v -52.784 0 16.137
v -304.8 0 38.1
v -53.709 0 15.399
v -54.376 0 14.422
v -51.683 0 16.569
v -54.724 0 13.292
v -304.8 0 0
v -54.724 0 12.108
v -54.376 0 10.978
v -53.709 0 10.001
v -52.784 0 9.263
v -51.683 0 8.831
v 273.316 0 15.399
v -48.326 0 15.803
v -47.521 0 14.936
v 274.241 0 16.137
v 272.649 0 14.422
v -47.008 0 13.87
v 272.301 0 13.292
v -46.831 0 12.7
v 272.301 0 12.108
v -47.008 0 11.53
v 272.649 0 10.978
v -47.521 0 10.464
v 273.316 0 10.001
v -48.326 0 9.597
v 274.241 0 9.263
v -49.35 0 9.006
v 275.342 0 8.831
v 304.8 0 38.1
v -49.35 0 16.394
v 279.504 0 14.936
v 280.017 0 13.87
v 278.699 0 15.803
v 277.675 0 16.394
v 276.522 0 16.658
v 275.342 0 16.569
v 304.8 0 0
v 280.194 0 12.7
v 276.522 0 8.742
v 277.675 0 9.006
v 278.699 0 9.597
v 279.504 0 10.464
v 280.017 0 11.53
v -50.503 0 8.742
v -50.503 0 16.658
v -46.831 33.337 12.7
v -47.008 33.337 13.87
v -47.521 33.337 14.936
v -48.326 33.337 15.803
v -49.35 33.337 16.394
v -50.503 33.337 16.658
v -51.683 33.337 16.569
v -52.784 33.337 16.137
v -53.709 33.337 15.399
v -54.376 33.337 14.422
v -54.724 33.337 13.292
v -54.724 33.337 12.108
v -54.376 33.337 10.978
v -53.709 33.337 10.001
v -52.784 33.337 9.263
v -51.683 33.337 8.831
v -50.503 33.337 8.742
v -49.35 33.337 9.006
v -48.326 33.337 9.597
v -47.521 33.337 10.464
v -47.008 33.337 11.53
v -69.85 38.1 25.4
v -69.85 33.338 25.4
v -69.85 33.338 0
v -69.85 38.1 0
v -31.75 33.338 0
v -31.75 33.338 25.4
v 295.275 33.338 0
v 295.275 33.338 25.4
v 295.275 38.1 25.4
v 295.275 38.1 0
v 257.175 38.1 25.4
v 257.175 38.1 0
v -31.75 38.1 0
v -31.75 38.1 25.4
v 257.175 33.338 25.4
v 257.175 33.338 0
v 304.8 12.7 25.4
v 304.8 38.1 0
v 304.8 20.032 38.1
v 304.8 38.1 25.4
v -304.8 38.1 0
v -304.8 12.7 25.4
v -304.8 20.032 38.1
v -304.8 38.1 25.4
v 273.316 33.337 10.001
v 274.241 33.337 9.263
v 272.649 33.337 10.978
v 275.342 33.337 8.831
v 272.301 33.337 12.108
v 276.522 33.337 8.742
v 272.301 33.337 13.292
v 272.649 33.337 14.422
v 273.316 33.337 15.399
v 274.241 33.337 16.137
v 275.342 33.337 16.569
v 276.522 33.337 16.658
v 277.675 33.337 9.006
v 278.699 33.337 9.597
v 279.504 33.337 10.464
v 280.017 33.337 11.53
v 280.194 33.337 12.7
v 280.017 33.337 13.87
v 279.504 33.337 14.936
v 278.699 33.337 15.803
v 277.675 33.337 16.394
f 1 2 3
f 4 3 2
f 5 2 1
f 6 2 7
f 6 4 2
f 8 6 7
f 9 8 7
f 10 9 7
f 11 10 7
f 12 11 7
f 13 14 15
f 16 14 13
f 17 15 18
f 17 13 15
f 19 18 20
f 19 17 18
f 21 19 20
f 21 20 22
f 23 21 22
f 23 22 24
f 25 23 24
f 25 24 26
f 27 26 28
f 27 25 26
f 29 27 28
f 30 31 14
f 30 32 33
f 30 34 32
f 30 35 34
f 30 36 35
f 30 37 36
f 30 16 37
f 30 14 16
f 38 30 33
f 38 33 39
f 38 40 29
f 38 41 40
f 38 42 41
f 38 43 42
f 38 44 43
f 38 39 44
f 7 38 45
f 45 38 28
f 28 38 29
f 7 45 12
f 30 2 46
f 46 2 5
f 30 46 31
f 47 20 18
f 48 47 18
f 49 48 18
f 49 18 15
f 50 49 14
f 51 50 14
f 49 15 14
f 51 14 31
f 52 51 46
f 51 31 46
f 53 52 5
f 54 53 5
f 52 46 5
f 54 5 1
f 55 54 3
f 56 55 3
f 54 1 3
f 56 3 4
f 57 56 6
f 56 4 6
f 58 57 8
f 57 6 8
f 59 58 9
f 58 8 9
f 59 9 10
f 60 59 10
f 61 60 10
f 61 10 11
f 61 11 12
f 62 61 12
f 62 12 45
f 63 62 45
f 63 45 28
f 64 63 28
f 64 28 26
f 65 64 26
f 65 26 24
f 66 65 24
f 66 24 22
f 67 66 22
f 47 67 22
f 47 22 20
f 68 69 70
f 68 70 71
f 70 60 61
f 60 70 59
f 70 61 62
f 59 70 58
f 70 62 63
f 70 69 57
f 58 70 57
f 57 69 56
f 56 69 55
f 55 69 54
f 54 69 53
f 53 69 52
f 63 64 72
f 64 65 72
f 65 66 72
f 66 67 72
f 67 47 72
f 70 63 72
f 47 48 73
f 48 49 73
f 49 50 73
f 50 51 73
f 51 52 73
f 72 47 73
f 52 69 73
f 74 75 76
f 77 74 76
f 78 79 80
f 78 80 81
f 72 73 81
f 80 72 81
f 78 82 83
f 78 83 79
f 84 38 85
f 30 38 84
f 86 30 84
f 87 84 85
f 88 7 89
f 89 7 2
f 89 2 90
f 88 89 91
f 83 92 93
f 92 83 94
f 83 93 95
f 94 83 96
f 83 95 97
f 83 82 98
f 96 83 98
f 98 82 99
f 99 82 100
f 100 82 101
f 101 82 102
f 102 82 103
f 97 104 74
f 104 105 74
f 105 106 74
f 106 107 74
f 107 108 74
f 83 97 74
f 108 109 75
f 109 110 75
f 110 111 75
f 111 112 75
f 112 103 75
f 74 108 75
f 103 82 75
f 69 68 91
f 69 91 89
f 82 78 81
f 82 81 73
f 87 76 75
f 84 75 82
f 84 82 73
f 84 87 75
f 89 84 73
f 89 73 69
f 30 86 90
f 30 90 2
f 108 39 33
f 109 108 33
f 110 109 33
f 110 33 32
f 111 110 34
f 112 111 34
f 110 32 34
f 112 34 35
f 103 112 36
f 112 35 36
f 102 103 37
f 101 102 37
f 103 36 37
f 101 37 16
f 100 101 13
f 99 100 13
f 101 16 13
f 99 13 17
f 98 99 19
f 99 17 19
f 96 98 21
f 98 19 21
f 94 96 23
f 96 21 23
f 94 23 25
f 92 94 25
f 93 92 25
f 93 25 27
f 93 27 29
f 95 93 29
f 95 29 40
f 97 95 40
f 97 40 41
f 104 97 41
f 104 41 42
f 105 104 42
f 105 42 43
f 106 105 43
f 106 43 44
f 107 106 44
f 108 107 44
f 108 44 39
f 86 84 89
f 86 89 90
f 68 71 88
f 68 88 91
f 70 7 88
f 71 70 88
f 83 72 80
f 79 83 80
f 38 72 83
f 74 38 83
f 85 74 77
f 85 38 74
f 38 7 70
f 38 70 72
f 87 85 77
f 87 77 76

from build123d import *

# Parameters (mm, degrees)
F1_DEPTH      = 304.8
F1_DEPTH_BACK = 304.8
F2_W          = 38.1
F2_H          = 4.7625
F3_DEPTH      = 25.401
F5_D          = 7.9375
F7_DEPTH      = 609.6


with BuildPart() as f1:
    # F0 (on Right) → F1 (new body, two sides)
    with BuildSketch(Plane.YZ) as f1_sk:
        Polygon((0, 38.1), (0, 0), (38.1, 0), (38.1, 25.4), (12.7, 25.4), (12.7, 38.1), align=None)
    extrude(amount=F1_DEPTH)
    extrude(f1_sk.sketch, amount=-F1_DEPTH_BACK)

    # F2 (on face) → F3 (cut, through all)
    with BuildSketch(Plane.XY.offset(25.4)):
        with Locations((-50.8, 35.71875)):
            Rectangle(F2_W, F2_H)
        with Locations((276.225, 35.71875)):
            Rectangle(F2_W, F2_H)
    extrude(amount=-F3_DEPTH, mode=Mode.SUBTRACT)

    # F5 (through all)
    with Locations(Plane(origin=(0, 33.3375, 0), x_dir=(-1, 0, 0), z_dir=(0, 1, 0))):
        with Locations((-276.225, 12.7), (50.8, 12.7)):
            Hole(F5_D / 2)

    # F6 (on face) → F7 (join, through all)
    with BuildSketch(Plane.YZ.offset(304.8)):
        Polygon((20.032348, 38.1), (12.7, 38.1), (12.7, 25.4), align=None)
    extrude(amount=-F7_DEPTH)


solid = f1.part
